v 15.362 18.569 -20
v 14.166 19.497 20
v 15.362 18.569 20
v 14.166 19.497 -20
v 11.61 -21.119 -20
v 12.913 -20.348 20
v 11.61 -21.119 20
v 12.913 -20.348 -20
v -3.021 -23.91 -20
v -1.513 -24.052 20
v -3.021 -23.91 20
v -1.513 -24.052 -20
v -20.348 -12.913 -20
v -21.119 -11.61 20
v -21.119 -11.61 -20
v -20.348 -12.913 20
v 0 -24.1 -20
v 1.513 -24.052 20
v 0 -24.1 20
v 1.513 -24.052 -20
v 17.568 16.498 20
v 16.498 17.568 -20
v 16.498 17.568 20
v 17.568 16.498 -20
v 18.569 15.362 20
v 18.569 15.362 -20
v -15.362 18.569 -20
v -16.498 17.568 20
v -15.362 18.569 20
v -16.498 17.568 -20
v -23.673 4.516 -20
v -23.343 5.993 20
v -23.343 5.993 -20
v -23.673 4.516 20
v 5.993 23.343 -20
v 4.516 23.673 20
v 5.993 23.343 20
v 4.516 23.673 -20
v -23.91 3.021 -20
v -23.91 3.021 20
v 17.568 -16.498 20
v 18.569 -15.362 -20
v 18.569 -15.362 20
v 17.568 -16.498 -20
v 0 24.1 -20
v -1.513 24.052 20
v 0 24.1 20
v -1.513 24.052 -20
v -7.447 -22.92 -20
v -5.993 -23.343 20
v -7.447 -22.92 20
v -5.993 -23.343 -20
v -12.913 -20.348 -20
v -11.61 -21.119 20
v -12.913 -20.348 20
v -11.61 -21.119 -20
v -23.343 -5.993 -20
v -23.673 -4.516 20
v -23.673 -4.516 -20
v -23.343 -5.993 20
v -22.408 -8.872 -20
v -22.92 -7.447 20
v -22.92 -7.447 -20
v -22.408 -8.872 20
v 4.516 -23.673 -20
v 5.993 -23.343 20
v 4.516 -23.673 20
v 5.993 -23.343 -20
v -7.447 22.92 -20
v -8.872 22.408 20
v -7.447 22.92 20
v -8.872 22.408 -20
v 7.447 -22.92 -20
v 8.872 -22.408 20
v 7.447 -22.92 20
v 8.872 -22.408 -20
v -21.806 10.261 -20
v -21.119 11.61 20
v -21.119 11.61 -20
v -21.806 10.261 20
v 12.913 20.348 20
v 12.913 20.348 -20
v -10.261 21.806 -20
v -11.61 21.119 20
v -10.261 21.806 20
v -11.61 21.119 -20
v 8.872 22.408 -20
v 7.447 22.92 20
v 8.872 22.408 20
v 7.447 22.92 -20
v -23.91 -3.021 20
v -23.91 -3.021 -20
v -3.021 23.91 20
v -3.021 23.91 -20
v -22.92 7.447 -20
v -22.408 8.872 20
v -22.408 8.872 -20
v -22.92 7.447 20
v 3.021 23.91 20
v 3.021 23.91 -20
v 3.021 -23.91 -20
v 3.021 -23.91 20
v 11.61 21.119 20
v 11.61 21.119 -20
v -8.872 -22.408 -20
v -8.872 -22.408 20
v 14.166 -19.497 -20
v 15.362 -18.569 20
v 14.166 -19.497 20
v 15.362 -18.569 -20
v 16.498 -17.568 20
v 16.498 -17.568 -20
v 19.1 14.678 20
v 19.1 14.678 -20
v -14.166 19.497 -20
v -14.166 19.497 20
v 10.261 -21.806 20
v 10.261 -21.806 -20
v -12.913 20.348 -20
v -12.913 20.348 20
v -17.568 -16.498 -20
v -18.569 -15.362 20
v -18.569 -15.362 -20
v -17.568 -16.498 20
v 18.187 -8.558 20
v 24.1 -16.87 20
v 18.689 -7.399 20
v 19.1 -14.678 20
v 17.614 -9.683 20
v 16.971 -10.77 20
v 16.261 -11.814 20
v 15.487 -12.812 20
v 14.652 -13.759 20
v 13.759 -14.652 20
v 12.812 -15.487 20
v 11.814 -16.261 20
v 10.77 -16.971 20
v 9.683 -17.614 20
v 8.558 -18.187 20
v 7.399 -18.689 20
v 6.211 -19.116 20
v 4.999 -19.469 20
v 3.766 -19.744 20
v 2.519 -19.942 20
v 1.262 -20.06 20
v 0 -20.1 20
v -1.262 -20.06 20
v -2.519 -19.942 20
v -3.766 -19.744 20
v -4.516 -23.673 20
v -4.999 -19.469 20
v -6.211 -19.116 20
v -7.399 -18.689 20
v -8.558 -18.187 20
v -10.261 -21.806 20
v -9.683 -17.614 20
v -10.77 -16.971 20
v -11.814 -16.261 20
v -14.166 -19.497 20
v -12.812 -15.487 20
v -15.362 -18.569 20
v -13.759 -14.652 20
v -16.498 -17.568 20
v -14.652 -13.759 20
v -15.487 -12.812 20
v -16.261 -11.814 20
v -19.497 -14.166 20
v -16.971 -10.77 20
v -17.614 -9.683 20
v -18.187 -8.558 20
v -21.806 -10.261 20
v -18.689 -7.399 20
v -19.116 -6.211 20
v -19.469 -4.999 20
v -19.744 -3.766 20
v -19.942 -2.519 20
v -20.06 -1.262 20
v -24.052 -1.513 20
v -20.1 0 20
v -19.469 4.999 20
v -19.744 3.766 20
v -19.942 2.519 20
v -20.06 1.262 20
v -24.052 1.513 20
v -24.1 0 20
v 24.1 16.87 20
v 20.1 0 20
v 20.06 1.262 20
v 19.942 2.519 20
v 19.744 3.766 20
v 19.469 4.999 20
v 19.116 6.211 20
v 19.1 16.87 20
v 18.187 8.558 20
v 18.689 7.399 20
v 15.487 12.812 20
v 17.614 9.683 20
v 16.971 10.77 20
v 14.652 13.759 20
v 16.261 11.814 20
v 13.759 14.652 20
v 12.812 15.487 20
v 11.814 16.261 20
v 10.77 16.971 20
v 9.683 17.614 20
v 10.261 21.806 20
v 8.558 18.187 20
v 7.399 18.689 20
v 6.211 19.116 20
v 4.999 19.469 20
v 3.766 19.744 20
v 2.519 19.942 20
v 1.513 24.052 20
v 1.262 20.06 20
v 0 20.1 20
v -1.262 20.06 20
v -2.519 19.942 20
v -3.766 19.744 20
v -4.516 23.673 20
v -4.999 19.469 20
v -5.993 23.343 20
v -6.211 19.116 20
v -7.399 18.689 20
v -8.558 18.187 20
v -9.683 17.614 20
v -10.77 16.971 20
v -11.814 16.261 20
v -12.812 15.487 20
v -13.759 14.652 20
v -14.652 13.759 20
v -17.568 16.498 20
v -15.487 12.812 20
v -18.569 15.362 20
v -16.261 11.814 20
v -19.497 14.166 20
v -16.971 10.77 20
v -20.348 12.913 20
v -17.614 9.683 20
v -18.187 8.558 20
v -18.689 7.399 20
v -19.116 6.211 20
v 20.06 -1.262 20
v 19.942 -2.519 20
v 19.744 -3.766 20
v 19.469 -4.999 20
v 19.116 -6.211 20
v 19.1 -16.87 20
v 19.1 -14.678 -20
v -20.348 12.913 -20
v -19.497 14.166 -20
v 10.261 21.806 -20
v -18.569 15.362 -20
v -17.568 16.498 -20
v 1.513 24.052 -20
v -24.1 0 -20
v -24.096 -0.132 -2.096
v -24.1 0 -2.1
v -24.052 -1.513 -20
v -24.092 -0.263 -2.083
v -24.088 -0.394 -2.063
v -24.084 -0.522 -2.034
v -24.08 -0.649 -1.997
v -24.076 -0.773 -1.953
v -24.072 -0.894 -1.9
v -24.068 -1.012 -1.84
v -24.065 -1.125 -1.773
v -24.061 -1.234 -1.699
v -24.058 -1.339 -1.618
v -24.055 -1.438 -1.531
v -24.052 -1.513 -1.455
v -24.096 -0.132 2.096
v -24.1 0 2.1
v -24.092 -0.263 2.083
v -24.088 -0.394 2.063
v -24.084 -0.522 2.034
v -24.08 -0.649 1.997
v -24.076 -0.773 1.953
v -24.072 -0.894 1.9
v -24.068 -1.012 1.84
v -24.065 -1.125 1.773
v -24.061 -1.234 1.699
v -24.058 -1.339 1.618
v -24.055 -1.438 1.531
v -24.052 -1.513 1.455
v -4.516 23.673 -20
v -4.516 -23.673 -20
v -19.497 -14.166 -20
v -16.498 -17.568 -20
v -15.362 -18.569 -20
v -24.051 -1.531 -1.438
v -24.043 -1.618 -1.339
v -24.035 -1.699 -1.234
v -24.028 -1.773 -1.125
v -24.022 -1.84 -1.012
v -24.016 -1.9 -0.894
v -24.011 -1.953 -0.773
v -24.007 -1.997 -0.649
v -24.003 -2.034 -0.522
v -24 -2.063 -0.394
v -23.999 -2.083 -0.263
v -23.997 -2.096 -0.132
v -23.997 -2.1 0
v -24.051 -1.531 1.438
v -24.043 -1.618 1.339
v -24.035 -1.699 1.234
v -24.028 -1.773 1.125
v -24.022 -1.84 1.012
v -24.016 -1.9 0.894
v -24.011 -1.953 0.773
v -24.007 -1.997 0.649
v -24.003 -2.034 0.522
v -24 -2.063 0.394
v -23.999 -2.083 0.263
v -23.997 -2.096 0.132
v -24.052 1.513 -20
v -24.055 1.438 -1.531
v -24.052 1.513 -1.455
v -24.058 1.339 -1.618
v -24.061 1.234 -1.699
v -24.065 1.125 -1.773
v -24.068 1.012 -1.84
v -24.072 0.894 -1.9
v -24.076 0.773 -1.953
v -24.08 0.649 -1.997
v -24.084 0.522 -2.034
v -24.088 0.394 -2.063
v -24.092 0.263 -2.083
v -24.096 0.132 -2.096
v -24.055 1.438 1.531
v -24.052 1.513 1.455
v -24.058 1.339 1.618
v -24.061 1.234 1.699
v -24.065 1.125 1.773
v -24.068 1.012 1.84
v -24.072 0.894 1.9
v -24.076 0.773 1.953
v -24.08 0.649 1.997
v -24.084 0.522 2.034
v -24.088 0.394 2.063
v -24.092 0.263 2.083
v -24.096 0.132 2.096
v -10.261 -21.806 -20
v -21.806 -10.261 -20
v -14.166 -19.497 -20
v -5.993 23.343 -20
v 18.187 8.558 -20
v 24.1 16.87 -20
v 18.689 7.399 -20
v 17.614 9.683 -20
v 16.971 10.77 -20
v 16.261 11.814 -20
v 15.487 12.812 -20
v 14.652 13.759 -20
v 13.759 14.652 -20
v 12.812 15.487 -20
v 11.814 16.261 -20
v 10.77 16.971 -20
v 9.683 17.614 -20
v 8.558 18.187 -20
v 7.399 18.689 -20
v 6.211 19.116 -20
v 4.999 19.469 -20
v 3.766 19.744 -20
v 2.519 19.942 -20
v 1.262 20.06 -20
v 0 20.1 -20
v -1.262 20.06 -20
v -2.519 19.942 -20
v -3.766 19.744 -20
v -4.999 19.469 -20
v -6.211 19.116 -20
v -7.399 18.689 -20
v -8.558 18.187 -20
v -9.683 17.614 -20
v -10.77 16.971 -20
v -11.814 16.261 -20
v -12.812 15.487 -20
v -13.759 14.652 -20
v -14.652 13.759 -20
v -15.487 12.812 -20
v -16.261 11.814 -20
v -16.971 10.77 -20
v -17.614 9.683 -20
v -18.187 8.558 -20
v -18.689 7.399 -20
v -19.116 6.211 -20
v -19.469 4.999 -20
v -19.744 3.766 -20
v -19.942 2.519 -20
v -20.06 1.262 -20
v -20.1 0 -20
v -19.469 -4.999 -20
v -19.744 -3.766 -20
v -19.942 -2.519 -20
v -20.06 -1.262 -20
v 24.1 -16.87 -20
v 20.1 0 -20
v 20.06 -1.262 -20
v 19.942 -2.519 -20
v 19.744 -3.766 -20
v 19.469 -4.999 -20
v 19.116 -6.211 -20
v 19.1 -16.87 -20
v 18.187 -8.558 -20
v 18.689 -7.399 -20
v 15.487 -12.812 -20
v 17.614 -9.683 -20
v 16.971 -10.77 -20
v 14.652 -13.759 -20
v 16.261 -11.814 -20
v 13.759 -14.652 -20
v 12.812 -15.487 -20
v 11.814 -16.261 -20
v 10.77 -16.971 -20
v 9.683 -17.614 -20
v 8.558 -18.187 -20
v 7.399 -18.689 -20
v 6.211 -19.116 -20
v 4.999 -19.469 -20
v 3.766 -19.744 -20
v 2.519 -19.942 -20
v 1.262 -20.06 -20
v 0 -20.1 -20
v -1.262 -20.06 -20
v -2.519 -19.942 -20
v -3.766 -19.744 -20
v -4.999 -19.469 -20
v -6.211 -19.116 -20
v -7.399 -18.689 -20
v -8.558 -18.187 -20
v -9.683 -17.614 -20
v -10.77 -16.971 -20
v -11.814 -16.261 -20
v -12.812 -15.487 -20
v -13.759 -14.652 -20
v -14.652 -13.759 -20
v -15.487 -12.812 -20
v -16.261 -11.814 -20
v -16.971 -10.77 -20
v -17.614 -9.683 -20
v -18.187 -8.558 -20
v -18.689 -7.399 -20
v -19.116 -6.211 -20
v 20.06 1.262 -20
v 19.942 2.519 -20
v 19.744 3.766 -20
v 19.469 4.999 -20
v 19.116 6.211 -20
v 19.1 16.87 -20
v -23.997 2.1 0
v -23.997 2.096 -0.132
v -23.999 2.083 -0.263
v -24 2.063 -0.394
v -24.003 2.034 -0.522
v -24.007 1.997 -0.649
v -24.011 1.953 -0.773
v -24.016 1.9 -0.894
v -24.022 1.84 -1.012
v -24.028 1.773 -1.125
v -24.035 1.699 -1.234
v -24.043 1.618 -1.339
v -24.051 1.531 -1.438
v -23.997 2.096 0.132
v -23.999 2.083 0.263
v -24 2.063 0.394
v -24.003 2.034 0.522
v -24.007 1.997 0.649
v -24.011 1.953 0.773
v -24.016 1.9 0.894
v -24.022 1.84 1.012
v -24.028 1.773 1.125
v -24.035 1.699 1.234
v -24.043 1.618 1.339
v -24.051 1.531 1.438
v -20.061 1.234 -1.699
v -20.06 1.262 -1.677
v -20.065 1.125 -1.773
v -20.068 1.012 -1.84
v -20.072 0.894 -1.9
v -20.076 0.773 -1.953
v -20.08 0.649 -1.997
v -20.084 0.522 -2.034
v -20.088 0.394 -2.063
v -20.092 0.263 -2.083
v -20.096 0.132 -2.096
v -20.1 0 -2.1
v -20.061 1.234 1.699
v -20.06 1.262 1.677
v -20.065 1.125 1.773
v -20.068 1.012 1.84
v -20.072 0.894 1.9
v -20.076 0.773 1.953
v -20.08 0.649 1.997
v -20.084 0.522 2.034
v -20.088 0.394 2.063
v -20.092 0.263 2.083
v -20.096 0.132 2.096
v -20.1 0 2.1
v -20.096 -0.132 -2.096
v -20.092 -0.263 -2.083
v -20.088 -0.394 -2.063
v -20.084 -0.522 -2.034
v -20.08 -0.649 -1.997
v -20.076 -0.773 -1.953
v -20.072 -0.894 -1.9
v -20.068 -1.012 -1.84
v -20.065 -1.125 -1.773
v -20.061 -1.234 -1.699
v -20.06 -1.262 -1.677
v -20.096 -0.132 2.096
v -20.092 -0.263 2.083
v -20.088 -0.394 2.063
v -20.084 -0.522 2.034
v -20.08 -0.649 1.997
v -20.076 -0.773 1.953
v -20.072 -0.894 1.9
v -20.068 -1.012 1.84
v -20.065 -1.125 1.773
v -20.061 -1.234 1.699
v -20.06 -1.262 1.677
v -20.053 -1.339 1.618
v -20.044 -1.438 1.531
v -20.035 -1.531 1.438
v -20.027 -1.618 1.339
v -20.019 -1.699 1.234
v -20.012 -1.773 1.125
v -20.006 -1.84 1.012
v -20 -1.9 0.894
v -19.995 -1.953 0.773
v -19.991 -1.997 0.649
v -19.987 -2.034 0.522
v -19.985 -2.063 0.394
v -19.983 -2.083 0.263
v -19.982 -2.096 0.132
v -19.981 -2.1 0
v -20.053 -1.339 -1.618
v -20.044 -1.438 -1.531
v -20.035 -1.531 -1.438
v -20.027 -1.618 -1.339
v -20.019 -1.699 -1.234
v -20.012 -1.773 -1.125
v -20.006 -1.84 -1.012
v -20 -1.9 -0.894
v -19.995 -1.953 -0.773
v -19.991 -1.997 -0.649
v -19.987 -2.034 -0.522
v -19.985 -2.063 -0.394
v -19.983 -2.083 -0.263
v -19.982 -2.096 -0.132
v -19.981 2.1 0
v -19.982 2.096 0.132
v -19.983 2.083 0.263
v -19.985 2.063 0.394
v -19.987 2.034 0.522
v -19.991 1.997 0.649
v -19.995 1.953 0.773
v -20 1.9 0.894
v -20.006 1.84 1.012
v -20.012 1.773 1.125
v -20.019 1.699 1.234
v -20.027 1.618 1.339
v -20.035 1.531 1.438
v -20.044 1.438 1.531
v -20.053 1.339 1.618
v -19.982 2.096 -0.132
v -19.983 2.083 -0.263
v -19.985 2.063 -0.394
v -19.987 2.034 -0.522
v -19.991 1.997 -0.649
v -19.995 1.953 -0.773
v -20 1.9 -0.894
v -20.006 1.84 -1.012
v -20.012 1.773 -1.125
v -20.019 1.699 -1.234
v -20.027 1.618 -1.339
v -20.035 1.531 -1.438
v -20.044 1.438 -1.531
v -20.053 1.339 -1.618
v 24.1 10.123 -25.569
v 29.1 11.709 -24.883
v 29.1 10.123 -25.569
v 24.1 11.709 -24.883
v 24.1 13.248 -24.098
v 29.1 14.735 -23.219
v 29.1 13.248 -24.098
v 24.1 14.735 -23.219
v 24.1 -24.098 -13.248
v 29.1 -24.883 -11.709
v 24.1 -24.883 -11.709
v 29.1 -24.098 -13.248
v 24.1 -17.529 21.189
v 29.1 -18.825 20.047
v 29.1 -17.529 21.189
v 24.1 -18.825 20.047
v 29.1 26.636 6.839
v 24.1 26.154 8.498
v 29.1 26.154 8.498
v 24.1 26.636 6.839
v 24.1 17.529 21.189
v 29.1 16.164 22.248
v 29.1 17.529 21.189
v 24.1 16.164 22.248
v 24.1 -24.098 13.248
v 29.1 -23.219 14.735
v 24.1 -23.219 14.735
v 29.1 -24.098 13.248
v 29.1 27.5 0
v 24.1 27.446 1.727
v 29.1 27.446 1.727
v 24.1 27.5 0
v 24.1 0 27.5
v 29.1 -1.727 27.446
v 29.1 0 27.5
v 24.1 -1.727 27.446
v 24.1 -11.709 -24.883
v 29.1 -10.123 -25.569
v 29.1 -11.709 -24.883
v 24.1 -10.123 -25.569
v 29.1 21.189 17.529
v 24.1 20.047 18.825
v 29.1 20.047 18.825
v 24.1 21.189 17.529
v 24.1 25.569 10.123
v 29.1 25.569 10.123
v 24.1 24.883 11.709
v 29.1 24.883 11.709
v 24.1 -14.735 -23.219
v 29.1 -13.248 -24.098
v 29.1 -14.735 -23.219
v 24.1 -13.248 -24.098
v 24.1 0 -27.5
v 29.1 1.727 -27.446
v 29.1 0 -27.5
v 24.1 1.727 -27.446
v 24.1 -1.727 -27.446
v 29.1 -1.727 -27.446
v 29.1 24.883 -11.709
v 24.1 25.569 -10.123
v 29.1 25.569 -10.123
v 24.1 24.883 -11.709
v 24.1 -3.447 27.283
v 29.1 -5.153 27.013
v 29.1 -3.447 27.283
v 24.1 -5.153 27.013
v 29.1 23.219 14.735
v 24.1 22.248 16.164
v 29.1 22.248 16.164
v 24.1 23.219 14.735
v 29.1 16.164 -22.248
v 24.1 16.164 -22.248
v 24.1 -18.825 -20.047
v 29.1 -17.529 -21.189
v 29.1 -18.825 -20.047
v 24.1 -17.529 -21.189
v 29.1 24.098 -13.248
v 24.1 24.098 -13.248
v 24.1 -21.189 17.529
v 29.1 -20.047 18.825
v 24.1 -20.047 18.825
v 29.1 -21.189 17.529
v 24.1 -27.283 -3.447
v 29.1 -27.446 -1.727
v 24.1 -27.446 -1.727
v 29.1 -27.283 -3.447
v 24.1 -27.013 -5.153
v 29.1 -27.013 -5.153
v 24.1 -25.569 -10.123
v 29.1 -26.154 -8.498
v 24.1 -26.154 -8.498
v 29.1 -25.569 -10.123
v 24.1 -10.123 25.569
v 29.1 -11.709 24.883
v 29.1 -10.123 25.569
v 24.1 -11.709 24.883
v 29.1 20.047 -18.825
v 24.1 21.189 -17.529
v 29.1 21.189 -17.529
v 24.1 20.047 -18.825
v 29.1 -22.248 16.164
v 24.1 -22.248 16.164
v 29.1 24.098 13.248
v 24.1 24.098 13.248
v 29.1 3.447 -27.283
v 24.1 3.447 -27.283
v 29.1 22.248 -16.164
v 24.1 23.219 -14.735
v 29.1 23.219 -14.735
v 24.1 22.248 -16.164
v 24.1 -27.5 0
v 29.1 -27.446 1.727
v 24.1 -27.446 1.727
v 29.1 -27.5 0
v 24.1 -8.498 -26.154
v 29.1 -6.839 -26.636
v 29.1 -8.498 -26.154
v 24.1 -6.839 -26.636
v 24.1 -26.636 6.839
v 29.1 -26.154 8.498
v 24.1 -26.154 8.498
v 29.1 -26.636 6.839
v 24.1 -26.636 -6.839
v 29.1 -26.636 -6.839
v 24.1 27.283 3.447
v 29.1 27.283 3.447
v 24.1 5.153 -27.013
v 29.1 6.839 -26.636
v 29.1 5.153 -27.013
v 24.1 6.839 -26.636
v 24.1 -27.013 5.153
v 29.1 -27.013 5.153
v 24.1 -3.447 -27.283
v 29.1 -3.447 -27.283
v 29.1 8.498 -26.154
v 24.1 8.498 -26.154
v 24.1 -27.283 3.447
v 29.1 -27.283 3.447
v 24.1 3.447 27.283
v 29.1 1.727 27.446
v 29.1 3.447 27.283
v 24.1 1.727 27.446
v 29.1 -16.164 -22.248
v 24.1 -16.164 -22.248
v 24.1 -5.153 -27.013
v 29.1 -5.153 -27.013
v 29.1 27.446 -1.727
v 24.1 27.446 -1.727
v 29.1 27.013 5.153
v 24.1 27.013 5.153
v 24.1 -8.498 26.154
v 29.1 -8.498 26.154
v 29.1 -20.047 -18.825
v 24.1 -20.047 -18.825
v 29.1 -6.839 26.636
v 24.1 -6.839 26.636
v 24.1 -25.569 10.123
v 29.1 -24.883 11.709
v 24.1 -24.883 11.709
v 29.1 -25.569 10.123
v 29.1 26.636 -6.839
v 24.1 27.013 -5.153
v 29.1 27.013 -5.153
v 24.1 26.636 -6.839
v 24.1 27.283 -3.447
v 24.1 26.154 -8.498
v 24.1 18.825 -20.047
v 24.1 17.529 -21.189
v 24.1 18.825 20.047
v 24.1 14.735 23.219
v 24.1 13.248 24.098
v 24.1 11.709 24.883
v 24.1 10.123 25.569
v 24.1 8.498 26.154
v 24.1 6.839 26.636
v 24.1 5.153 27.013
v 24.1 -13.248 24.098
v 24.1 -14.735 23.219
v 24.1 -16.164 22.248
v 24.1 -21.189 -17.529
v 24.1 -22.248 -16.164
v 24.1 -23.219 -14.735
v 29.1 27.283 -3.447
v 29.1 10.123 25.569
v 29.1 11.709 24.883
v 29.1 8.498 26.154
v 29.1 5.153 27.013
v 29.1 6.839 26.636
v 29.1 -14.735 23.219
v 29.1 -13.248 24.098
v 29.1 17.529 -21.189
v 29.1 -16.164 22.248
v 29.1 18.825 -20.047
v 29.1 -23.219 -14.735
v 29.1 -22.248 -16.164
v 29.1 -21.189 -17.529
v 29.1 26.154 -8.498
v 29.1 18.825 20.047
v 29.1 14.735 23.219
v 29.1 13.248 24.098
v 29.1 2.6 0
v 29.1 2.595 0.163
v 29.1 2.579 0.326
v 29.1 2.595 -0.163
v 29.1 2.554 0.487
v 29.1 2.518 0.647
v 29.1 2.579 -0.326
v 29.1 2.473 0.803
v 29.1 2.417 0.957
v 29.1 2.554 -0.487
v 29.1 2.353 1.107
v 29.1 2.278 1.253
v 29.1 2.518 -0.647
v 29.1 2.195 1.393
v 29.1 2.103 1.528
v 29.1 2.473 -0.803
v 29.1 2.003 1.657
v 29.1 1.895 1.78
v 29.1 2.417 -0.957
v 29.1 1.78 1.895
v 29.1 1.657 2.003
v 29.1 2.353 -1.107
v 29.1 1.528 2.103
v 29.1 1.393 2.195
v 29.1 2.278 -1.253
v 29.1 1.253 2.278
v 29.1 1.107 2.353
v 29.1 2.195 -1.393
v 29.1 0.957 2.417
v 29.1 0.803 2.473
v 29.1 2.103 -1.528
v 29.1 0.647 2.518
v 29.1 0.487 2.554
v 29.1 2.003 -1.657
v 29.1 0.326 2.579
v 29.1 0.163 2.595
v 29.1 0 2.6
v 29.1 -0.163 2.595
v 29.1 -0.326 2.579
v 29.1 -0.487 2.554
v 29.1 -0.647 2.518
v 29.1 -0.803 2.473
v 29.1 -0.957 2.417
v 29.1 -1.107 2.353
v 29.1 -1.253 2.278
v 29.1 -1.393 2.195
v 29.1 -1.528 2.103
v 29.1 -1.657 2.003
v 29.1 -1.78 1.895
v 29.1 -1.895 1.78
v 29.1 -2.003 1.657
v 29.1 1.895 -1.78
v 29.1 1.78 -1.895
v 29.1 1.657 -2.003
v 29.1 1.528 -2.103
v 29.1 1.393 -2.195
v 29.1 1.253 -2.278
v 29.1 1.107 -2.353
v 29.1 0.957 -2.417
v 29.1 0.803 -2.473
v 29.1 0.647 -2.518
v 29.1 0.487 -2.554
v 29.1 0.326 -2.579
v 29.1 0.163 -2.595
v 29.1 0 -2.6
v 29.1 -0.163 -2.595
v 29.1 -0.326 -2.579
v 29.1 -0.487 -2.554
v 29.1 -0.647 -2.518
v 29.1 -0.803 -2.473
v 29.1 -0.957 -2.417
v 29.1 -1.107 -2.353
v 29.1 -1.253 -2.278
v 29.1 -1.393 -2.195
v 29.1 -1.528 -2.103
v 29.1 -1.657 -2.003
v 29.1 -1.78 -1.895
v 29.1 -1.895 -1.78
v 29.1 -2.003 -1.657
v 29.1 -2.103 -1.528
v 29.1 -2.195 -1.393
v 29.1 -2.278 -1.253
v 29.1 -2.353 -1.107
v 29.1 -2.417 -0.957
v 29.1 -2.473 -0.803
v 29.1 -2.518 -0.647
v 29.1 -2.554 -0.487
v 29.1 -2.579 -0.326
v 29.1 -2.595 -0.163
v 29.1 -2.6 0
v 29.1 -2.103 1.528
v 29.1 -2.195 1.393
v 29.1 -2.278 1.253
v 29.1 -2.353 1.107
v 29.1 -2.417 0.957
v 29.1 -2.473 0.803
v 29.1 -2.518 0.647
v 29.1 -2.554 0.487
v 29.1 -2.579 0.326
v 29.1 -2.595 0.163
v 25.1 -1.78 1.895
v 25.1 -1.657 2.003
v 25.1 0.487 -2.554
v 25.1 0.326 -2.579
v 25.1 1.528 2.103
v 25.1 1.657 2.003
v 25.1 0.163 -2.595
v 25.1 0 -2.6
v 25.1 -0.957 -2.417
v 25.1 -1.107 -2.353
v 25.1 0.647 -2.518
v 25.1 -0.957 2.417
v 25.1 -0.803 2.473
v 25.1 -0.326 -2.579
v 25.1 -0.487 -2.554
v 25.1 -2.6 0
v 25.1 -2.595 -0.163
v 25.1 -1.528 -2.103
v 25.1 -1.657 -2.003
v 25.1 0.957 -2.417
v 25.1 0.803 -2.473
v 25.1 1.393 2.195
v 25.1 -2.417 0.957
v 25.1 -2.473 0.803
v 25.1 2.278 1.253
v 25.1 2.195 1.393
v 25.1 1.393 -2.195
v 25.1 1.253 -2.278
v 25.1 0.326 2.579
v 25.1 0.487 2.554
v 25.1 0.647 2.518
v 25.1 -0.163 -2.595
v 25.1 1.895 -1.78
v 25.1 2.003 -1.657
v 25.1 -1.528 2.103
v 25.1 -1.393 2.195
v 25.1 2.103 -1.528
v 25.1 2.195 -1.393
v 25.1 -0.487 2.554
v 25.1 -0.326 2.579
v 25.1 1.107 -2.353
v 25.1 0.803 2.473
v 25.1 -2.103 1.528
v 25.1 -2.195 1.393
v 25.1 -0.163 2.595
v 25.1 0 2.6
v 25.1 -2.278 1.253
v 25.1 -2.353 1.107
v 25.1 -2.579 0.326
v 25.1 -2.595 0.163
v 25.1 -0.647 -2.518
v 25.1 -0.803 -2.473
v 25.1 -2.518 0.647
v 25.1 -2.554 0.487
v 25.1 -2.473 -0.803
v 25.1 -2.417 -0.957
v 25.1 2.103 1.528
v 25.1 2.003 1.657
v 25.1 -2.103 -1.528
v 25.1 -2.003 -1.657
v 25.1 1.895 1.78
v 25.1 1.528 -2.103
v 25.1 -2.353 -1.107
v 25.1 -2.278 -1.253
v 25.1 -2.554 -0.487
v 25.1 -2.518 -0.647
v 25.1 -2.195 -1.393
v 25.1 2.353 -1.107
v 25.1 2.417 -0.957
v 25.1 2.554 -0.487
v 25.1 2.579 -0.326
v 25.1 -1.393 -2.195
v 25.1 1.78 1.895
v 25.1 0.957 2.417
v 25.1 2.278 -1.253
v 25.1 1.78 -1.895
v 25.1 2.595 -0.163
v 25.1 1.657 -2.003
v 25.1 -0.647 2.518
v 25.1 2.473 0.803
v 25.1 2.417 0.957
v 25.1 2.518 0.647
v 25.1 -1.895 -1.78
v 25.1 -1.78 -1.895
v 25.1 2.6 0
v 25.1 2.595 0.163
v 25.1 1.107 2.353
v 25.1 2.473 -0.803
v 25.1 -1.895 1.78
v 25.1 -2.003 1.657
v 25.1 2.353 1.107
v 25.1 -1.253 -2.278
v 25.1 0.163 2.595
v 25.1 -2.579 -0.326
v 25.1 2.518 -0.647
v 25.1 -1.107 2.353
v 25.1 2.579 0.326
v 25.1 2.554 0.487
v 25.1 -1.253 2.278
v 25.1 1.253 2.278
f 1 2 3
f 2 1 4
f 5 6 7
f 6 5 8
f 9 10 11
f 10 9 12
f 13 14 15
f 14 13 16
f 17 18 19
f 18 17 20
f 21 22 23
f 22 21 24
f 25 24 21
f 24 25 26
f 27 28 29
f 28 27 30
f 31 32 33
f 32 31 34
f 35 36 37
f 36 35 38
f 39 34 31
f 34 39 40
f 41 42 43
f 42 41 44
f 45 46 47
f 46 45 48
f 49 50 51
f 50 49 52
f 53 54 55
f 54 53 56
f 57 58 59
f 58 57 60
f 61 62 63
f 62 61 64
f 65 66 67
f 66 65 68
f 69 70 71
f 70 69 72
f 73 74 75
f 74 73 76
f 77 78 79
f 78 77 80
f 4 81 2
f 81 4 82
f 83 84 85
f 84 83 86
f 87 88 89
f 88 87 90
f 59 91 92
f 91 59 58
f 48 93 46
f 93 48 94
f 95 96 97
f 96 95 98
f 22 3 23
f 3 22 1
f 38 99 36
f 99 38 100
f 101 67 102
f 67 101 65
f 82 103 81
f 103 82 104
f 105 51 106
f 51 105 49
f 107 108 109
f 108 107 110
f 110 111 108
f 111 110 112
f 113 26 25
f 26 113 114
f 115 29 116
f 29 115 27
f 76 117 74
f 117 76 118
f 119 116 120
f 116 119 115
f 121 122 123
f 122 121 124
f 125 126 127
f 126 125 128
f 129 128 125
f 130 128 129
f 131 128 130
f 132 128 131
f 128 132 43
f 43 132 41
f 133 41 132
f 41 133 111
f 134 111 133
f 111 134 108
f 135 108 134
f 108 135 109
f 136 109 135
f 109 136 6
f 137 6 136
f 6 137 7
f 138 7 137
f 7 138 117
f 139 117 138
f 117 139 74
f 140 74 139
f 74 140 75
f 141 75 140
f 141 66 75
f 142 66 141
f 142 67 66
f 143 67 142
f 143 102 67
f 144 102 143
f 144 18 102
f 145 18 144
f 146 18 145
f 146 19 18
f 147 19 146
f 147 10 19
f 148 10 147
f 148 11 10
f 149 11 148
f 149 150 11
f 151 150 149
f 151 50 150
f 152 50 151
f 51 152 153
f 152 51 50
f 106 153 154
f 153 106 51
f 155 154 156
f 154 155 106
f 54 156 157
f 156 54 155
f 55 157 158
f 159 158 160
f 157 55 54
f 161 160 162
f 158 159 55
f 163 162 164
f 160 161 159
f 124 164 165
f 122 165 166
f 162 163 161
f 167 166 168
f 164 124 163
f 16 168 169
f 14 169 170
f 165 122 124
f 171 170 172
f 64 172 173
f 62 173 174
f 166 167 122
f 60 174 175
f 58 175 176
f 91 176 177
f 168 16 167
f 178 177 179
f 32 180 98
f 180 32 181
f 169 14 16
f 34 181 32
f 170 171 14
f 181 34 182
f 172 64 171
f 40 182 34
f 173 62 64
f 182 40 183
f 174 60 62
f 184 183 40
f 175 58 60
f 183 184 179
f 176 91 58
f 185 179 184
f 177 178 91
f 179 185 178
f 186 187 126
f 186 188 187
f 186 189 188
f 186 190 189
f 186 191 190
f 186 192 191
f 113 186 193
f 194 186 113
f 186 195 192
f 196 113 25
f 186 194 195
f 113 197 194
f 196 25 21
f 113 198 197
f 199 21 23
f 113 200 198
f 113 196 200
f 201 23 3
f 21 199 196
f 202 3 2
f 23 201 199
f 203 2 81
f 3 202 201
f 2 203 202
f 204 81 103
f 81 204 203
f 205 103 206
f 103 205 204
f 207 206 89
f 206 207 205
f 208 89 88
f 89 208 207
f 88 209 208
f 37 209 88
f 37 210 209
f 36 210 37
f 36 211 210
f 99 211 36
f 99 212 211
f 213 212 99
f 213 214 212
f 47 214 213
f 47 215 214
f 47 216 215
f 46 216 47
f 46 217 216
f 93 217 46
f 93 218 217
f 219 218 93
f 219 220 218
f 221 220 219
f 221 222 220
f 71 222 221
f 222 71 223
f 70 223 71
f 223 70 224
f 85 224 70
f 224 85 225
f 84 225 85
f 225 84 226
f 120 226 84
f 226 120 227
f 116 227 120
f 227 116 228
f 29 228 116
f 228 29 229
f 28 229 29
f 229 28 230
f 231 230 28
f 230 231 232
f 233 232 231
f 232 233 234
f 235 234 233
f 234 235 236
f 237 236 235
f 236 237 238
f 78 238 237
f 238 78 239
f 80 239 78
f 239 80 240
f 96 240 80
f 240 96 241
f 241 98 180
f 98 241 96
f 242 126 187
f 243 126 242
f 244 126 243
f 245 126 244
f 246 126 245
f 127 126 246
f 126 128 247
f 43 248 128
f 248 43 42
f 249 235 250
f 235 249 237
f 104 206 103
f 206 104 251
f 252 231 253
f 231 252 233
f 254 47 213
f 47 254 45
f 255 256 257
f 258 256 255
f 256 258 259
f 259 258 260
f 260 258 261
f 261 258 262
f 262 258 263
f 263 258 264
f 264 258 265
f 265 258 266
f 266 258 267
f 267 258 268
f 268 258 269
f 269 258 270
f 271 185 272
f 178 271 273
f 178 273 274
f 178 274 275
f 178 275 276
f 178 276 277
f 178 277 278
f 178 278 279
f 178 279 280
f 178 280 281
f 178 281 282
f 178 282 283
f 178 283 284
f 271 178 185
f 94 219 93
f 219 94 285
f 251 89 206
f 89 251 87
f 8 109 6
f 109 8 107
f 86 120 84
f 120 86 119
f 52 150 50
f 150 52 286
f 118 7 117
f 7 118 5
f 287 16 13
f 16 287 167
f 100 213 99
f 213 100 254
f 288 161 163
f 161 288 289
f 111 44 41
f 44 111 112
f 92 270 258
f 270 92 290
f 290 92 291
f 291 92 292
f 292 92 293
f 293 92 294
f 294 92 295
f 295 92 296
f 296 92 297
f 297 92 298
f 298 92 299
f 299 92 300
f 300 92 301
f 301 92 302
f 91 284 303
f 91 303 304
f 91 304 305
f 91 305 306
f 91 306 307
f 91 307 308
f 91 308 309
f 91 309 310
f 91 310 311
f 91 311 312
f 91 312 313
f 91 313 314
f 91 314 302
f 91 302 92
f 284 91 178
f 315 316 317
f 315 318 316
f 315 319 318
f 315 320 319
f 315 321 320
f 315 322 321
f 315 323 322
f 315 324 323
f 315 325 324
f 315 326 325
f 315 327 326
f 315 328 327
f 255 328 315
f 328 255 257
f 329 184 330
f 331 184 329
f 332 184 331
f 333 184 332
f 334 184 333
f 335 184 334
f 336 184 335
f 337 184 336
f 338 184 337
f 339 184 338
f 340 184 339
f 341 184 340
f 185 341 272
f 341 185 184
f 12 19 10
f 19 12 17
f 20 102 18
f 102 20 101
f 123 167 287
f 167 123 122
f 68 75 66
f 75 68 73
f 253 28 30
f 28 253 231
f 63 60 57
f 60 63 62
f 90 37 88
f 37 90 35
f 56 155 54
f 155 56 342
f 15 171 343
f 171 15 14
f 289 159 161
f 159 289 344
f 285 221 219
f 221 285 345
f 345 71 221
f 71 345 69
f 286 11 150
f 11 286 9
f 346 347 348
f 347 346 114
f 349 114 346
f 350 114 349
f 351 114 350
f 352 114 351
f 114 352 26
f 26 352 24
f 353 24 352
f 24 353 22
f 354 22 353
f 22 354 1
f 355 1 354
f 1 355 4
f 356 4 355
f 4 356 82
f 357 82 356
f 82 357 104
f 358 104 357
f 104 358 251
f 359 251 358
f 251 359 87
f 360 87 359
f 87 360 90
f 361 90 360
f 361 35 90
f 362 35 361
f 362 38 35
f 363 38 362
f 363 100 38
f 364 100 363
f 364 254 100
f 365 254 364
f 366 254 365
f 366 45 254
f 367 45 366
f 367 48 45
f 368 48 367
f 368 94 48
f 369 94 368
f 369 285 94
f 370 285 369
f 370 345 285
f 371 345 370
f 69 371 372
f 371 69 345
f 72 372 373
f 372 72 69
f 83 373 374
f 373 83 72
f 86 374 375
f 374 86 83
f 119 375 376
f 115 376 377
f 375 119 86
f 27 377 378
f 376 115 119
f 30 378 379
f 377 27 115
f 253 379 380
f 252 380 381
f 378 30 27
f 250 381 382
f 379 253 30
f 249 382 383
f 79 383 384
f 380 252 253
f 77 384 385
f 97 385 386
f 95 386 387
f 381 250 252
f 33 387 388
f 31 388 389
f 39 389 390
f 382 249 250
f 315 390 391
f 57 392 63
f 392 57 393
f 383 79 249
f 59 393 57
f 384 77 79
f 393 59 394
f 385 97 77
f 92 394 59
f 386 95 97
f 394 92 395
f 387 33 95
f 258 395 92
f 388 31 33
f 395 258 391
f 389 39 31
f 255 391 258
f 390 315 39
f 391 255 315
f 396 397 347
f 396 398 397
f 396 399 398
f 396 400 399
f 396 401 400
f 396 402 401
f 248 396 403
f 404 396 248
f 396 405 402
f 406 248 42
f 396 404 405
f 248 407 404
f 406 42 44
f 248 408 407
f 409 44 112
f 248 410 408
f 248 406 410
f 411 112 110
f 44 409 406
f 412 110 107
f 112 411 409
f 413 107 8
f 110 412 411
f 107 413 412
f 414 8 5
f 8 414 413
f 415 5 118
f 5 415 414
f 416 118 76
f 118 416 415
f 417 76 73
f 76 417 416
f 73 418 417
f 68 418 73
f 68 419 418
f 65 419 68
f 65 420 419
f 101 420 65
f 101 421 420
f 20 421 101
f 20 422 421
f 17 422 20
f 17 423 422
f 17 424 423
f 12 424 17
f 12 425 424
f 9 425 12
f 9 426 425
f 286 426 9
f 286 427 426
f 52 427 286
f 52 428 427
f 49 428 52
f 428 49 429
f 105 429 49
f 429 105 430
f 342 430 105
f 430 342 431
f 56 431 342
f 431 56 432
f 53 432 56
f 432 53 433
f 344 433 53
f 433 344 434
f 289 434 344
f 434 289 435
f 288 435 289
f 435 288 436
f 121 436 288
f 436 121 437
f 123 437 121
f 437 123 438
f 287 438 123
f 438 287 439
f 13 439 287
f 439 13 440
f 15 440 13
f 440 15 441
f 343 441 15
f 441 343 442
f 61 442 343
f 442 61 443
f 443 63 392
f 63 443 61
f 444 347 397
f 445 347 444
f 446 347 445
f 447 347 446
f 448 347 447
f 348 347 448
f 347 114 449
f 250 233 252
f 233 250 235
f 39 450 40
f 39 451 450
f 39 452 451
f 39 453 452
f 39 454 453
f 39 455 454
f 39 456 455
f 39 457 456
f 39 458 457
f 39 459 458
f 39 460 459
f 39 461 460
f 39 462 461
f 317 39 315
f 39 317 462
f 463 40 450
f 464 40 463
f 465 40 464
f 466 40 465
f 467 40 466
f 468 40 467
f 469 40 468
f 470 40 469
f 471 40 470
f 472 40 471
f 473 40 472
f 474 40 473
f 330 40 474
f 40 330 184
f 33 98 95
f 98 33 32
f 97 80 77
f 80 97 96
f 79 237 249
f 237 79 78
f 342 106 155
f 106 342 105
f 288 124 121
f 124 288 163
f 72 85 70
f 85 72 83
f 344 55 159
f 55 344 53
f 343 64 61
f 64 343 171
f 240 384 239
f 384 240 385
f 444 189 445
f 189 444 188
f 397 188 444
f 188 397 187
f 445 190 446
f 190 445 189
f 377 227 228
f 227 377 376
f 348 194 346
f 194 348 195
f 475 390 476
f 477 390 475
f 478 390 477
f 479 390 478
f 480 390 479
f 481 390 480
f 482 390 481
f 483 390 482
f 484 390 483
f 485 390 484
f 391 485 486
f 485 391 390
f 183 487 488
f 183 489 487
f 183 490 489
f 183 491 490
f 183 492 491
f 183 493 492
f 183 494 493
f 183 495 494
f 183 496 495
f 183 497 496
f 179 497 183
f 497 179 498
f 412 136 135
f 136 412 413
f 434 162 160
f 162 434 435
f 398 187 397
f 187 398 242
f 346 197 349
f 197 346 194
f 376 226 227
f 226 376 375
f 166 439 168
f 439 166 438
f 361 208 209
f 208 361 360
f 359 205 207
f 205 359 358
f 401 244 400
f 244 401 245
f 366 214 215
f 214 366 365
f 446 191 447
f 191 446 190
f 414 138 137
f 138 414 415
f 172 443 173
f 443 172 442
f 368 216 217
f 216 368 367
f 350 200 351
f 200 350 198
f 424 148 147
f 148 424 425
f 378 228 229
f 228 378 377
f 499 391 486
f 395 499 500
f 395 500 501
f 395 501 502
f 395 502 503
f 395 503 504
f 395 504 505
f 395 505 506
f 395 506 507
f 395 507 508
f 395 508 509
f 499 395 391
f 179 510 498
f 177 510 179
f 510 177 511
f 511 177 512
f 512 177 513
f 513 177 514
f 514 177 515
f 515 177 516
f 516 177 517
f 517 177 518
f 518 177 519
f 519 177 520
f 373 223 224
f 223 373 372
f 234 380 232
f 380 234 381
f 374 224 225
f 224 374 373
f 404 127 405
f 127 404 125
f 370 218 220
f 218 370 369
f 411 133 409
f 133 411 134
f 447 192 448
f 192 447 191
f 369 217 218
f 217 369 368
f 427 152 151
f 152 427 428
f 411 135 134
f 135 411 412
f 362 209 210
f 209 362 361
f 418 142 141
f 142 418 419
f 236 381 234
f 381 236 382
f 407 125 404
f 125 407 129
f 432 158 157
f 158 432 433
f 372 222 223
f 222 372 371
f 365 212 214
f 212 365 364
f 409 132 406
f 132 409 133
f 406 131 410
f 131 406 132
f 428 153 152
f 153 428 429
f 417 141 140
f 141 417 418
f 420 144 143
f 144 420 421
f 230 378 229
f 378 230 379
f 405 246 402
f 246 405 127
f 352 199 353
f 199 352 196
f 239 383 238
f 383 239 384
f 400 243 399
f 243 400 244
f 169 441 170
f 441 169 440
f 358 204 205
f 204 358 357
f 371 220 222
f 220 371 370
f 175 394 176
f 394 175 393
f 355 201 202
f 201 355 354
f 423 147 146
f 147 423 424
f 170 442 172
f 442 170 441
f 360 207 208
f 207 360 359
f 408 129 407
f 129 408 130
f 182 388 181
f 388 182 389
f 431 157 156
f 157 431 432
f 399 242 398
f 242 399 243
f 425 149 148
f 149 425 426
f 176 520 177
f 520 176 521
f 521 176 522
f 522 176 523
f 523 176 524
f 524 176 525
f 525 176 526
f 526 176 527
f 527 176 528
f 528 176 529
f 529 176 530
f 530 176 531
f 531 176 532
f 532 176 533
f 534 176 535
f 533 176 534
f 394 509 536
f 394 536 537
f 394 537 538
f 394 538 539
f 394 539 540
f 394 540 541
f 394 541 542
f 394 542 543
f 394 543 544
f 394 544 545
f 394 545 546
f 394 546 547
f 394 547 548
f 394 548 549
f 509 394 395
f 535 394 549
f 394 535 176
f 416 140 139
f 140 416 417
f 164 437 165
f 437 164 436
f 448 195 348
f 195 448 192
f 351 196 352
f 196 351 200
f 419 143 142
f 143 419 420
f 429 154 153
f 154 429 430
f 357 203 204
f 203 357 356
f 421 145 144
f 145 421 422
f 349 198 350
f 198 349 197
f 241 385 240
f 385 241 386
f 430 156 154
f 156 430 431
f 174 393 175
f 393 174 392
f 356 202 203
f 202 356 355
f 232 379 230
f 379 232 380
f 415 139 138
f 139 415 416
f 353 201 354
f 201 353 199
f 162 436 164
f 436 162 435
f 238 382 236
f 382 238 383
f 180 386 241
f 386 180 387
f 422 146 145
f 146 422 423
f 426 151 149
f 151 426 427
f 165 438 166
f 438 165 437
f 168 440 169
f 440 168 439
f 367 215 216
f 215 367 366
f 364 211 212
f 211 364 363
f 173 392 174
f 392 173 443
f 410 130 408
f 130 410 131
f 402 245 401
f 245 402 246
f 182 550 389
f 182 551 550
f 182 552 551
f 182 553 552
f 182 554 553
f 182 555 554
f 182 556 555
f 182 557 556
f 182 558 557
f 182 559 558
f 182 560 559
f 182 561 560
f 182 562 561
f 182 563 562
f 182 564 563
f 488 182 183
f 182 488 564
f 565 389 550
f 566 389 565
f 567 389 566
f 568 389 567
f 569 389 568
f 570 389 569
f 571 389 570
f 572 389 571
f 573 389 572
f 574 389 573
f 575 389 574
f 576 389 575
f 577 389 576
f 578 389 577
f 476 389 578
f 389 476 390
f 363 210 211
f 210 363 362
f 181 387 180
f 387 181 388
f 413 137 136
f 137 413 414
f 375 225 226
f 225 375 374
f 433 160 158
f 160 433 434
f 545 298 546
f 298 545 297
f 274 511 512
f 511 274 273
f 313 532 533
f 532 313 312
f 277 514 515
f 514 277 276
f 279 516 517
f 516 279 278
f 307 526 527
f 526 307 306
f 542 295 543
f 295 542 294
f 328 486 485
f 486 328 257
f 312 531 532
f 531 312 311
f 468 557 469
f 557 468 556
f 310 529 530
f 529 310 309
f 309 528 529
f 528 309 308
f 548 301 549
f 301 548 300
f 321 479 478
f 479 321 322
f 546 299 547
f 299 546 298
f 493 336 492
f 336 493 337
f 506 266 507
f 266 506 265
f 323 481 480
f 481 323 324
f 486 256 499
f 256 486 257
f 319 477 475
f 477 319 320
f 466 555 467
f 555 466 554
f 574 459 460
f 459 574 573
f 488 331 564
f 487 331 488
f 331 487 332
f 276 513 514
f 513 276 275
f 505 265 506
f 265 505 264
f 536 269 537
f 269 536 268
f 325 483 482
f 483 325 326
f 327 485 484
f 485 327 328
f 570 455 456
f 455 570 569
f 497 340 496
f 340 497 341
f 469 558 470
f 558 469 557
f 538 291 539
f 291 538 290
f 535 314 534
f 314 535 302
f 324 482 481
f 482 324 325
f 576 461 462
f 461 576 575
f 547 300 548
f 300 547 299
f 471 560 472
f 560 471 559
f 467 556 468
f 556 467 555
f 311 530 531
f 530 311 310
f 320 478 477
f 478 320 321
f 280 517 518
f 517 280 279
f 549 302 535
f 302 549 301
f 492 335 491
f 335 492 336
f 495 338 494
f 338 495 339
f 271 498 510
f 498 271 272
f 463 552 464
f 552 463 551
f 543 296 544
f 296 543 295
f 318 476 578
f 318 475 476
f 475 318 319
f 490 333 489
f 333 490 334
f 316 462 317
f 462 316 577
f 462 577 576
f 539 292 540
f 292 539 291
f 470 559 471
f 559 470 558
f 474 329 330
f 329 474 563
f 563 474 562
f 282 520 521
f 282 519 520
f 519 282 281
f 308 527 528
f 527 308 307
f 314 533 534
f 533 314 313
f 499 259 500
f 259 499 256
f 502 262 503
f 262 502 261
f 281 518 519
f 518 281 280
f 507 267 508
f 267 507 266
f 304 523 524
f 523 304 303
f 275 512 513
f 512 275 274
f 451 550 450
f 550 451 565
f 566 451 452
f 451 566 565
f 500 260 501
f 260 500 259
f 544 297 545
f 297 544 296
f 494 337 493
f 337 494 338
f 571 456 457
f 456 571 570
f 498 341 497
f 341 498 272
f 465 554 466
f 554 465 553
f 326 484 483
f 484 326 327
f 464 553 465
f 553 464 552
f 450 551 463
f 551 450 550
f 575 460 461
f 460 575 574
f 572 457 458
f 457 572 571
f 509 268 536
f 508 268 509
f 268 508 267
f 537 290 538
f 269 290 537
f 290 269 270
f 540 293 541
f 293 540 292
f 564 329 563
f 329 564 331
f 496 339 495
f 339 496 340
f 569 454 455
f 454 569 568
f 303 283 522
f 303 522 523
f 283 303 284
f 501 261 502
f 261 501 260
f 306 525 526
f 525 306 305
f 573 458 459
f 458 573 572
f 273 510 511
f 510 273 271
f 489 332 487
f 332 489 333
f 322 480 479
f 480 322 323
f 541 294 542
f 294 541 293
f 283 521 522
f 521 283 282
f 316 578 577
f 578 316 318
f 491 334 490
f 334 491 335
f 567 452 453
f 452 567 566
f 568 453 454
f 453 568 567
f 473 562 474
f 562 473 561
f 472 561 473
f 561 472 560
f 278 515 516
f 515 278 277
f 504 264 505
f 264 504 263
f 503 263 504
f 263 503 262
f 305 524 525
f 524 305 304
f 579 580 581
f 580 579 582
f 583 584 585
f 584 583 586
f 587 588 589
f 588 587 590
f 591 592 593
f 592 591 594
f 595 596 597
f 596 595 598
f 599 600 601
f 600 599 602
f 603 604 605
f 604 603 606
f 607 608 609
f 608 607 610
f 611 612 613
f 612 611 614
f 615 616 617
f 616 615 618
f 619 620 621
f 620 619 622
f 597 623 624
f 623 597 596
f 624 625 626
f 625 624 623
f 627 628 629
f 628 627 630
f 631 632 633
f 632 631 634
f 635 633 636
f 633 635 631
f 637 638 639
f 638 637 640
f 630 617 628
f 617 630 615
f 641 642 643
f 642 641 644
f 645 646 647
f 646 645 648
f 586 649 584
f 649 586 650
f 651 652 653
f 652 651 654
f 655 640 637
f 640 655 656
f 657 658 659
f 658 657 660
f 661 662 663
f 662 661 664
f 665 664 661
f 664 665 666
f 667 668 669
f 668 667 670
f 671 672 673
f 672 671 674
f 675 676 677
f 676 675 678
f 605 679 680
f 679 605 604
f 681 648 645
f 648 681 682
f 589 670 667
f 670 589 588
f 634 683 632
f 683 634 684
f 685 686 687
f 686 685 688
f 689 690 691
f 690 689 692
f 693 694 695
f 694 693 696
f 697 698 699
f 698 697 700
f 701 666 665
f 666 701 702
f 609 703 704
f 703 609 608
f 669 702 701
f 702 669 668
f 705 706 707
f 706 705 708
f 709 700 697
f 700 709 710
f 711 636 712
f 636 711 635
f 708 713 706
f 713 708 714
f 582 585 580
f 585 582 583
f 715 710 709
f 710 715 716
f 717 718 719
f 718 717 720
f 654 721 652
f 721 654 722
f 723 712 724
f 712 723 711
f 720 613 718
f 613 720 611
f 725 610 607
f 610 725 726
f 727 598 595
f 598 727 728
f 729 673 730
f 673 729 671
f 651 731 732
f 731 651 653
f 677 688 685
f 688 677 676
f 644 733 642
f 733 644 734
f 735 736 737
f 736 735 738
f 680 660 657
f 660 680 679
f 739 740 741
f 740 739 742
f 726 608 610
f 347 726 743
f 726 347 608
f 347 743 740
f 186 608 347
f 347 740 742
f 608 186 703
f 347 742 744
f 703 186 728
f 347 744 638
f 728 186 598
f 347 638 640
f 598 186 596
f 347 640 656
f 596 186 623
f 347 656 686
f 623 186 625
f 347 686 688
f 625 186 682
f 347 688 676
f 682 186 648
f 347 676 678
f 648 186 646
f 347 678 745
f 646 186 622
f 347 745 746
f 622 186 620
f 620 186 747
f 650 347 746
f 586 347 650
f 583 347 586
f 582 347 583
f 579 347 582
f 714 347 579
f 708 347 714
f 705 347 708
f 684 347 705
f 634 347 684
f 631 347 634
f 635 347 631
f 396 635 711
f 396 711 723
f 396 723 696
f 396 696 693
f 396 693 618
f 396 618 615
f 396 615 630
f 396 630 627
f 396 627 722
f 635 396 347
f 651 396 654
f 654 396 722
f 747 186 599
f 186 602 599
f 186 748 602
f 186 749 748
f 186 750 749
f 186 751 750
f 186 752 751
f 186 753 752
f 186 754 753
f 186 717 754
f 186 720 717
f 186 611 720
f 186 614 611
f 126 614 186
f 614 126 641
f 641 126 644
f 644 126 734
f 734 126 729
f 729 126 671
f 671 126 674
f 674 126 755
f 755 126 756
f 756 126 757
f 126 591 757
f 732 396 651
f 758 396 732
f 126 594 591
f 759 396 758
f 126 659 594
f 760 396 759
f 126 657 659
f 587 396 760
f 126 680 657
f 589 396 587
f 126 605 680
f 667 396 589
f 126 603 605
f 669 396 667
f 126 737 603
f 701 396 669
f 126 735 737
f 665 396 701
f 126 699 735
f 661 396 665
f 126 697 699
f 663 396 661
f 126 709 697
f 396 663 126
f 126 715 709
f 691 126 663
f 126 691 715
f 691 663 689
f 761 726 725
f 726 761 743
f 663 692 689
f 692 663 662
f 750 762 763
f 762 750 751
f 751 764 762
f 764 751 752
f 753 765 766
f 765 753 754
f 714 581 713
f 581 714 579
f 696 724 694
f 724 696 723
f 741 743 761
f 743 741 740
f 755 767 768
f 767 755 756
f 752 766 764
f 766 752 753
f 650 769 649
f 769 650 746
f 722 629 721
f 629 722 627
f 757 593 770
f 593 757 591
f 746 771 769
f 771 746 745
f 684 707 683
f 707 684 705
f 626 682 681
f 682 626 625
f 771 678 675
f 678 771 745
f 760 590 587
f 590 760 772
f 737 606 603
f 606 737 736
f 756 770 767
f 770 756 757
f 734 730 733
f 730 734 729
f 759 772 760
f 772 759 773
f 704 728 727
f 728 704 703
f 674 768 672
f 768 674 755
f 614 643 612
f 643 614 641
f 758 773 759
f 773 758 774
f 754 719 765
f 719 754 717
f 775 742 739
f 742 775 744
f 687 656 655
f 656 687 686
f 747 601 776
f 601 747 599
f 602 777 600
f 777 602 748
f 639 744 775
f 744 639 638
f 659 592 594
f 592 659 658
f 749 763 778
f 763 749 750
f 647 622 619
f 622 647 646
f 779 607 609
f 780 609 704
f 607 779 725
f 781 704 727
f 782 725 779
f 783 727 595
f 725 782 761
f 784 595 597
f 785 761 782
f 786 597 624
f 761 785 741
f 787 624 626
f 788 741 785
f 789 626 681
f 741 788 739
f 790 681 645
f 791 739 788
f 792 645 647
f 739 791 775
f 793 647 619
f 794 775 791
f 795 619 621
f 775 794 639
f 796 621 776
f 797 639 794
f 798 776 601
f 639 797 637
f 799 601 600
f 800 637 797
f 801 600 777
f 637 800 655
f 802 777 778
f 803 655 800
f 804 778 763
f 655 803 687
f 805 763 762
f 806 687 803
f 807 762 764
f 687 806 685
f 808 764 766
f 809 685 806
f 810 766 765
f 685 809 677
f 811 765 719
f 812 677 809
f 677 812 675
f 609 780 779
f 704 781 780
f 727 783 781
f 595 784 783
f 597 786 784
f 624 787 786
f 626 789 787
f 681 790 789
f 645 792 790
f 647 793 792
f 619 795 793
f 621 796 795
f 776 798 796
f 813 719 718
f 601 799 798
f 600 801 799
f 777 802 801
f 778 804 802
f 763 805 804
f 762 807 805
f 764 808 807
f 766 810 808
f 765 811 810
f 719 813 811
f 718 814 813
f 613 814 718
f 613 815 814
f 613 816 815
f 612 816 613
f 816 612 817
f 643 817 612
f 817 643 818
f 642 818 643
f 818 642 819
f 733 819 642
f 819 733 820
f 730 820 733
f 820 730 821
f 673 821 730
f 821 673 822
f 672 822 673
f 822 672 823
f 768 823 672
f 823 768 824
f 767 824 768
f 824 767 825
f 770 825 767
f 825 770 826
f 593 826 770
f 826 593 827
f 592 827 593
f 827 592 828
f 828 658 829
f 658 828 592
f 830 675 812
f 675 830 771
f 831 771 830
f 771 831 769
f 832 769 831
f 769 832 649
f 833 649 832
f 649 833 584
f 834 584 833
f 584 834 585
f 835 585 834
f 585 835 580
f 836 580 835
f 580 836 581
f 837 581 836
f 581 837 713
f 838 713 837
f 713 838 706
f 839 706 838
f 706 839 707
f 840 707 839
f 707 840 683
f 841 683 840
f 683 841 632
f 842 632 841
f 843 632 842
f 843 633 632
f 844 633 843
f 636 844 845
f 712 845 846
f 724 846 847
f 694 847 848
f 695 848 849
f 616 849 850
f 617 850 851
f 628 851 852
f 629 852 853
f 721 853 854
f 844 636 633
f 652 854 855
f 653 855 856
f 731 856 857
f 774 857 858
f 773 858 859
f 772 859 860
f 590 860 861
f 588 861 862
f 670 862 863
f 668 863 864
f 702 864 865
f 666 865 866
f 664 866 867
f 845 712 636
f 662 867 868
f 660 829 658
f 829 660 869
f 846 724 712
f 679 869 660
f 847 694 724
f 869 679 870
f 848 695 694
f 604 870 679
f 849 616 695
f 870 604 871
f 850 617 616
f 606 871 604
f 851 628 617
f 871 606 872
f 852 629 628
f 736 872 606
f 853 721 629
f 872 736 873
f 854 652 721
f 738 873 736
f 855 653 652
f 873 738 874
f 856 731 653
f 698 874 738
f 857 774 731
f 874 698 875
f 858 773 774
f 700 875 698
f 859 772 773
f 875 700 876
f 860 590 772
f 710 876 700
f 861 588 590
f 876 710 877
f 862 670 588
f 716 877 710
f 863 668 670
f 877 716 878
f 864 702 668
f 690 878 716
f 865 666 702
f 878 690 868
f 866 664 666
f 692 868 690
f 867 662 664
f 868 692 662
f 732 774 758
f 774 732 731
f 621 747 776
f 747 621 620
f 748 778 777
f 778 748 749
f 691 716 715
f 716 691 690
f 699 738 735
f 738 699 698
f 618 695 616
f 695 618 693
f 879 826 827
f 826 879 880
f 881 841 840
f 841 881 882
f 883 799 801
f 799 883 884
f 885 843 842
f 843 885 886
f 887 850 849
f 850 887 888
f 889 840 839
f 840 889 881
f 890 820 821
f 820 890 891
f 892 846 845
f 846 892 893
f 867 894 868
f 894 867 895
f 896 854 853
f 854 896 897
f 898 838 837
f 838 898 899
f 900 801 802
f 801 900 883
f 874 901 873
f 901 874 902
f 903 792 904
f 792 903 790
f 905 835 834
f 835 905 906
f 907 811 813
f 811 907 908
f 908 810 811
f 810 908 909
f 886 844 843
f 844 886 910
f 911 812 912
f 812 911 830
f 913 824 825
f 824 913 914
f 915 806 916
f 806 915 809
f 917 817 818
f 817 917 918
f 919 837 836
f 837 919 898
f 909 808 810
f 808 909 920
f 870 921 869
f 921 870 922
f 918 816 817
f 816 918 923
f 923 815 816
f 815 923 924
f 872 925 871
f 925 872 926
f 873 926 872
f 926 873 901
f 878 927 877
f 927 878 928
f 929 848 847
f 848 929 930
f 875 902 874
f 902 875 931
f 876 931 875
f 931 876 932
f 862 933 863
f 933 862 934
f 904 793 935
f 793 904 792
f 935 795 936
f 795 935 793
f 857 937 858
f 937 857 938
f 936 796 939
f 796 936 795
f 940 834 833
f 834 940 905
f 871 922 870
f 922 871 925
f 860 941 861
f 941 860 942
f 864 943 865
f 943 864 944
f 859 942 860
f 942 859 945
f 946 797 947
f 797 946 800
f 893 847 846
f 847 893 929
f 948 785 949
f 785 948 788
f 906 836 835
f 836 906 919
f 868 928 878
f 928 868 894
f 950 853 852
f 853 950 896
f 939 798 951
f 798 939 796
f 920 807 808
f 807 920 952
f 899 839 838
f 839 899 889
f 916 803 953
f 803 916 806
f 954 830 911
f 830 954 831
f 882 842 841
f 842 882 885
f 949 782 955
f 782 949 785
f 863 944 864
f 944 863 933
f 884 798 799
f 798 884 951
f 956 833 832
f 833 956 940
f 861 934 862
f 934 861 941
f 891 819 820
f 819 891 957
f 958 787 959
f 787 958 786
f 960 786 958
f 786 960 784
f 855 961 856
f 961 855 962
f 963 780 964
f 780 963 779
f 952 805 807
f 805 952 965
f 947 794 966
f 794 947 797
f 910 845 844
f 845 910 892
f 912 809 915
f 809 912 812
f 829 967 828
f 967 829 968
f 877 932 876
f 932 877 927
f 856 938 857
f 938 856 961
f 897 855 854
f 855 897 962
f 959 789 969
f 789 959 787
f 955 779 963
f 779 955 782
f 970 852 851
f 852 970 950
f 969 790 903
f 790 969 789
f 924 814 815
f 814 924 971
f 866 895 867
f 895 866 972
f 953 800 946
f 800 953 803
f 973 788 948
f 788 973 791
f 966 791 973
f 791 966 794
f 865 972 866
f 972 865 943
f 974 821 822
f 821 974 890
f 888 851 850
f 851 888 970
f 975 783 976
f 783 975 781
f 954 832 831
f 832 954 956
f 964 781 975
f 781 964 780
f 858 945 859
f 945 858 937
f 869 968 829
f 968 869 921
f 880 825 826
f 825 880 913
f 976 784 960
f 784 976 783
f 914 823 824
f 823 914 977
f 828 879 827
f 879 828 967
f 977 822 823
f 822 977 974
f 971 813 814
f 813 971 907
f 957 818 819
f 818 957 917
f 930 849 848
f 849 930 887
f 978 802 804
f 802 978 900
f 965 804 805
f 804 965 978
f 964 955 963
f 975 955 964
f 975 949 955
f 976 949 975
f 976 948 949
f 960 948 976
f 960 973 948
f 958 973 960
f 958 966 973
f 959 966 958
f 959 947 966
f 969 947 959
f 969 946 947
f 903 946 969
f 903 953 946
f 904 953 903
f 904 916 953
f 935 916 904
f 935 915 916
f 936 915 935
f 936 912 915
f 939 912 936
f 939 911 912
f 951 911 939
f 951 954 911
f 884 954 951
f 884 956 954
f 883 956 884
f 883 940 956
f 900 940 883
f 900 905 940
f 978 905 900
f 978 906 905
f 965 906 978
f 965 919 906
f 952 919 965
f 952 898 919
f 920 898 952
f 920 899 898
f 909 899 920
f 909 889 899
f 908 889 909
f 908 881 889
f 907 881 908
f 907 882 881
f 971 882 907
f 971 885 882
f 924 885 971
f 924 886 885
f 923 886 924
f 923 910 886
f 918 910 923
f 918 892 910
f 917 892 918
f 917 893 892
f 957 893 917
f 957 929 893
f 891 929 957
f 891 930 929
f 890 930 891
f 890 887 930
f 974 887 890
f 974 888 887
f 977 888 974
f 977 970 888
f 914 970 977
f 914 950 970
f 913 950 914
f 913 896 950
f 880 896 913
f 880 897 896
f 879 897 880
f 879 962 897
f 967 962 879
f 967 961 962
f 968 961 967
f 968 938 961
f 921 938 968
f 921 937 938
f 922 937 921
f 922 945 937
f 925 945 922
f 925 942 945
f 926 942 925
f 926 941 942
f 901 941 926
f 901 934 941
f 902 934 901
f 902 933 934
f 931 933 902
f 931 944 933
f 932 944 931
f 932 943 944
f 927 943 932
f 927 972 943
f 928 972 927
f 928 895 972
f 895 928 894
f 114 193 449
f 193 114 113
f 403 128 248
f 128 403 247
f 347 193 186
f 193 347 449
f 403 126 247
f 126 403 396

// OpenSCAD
/*
 * Modulares OpenSCAD Modell: Muffe 1 (parallele Befestigungsscheibe)
 * Eigenschaften: Durchgehende Muffe mit paralleler Befestigungsscheibe,
 * Fixierlöcher in Muffe und Scheibe.
 */

$fn = 100;

// --- PARAMETER ---
rohr_nennmass = 40.0;                         // 20, 25, 30, 40 mm
toleranz = 0.2;
innen_durchmesser = rohr_nennmass + toleranz;
wanddicke = (rohr_nennmass <= 25) ? 3.5 : 4.0;
aussen_durchmesser = innen_durchmesser + (wanddicke * 2);
muffen_laenge = max(25.0, rohr_nennmass);

// Scheibe (Parallel zum Rohr)
scheiben_durchmesser = rohr_nennmass + 15.0;
scheiben_dicke = 5.0;
abstand_scheibe_rohrmitte = (aussen_durchmesser / 2) + (scheiben_dicke / 2);

// Bohrungen
loch_durchmesser_scheibe = 5.2;
loch_durchmesser_muffe = (rohr_nennmass <= 25) ? 3.2 : 4.2;

// --- HAUPTBAUGRUPPE ---
rohr_verbinder();

module rohr_verbinder() {
    union() {
        rohr_muffe();
        befestigungs_scheibe();
        verbindungs_steg();
    }
}

module rohr_muffe() {
    difference() {
        cylinder(d=aussen_durchmesser, h=muffen_laenge, center=true);
        cylinder(d=innen_durchmesser, h=muffen_laenge + 2, center=true);
        translate([-aussen_durchmesser/2, 0, 0])
            rotate([0, 90, 0])
            cylinder(d=loch_durchmesser_muffe, h=wanddicke + 5, center=true);
    }
}

module befestigungs_scheibe() {
    translate([abstand_scheibe_rohrmitte, 0, 0]) {
        difference() {
            rotate([0, 90, 0])
                cylinder(d=scheiben_durchmesser, h=scheiben_dicke, center=true);
            rotate([0, 90, 0])
                cylinder(d=loch_durchmesser_scheibe, h=scheiben_dicke + 2, center=true);
        }
    }
}

module verbindungs_steg() {
    difference() {
        translate([abstand_scheibe_rohrmitte - (scheiben_dicke/2) - (wanddicke/2), 0, 0])
            cube([wanddicke + 2, aussen_durchmesser * 0.7, muffen_laenge], center=true);
        cylinder(d=innen_durchmesser, h=muffen_laenge + 2, center=true);
        translate([abstand_scheibe_rohrmitte, 0, 0])
            difference() {
                cube([scheiben_dicke + 2, scheiben_durchmesser + 10, muffen_laenge + 10], center=true);
                rotate([0, 90, 0])
                    cylinder(d=scheiben_durchmesser, h=scheiben_dicke + 2, center=true);
            }
    }
}
